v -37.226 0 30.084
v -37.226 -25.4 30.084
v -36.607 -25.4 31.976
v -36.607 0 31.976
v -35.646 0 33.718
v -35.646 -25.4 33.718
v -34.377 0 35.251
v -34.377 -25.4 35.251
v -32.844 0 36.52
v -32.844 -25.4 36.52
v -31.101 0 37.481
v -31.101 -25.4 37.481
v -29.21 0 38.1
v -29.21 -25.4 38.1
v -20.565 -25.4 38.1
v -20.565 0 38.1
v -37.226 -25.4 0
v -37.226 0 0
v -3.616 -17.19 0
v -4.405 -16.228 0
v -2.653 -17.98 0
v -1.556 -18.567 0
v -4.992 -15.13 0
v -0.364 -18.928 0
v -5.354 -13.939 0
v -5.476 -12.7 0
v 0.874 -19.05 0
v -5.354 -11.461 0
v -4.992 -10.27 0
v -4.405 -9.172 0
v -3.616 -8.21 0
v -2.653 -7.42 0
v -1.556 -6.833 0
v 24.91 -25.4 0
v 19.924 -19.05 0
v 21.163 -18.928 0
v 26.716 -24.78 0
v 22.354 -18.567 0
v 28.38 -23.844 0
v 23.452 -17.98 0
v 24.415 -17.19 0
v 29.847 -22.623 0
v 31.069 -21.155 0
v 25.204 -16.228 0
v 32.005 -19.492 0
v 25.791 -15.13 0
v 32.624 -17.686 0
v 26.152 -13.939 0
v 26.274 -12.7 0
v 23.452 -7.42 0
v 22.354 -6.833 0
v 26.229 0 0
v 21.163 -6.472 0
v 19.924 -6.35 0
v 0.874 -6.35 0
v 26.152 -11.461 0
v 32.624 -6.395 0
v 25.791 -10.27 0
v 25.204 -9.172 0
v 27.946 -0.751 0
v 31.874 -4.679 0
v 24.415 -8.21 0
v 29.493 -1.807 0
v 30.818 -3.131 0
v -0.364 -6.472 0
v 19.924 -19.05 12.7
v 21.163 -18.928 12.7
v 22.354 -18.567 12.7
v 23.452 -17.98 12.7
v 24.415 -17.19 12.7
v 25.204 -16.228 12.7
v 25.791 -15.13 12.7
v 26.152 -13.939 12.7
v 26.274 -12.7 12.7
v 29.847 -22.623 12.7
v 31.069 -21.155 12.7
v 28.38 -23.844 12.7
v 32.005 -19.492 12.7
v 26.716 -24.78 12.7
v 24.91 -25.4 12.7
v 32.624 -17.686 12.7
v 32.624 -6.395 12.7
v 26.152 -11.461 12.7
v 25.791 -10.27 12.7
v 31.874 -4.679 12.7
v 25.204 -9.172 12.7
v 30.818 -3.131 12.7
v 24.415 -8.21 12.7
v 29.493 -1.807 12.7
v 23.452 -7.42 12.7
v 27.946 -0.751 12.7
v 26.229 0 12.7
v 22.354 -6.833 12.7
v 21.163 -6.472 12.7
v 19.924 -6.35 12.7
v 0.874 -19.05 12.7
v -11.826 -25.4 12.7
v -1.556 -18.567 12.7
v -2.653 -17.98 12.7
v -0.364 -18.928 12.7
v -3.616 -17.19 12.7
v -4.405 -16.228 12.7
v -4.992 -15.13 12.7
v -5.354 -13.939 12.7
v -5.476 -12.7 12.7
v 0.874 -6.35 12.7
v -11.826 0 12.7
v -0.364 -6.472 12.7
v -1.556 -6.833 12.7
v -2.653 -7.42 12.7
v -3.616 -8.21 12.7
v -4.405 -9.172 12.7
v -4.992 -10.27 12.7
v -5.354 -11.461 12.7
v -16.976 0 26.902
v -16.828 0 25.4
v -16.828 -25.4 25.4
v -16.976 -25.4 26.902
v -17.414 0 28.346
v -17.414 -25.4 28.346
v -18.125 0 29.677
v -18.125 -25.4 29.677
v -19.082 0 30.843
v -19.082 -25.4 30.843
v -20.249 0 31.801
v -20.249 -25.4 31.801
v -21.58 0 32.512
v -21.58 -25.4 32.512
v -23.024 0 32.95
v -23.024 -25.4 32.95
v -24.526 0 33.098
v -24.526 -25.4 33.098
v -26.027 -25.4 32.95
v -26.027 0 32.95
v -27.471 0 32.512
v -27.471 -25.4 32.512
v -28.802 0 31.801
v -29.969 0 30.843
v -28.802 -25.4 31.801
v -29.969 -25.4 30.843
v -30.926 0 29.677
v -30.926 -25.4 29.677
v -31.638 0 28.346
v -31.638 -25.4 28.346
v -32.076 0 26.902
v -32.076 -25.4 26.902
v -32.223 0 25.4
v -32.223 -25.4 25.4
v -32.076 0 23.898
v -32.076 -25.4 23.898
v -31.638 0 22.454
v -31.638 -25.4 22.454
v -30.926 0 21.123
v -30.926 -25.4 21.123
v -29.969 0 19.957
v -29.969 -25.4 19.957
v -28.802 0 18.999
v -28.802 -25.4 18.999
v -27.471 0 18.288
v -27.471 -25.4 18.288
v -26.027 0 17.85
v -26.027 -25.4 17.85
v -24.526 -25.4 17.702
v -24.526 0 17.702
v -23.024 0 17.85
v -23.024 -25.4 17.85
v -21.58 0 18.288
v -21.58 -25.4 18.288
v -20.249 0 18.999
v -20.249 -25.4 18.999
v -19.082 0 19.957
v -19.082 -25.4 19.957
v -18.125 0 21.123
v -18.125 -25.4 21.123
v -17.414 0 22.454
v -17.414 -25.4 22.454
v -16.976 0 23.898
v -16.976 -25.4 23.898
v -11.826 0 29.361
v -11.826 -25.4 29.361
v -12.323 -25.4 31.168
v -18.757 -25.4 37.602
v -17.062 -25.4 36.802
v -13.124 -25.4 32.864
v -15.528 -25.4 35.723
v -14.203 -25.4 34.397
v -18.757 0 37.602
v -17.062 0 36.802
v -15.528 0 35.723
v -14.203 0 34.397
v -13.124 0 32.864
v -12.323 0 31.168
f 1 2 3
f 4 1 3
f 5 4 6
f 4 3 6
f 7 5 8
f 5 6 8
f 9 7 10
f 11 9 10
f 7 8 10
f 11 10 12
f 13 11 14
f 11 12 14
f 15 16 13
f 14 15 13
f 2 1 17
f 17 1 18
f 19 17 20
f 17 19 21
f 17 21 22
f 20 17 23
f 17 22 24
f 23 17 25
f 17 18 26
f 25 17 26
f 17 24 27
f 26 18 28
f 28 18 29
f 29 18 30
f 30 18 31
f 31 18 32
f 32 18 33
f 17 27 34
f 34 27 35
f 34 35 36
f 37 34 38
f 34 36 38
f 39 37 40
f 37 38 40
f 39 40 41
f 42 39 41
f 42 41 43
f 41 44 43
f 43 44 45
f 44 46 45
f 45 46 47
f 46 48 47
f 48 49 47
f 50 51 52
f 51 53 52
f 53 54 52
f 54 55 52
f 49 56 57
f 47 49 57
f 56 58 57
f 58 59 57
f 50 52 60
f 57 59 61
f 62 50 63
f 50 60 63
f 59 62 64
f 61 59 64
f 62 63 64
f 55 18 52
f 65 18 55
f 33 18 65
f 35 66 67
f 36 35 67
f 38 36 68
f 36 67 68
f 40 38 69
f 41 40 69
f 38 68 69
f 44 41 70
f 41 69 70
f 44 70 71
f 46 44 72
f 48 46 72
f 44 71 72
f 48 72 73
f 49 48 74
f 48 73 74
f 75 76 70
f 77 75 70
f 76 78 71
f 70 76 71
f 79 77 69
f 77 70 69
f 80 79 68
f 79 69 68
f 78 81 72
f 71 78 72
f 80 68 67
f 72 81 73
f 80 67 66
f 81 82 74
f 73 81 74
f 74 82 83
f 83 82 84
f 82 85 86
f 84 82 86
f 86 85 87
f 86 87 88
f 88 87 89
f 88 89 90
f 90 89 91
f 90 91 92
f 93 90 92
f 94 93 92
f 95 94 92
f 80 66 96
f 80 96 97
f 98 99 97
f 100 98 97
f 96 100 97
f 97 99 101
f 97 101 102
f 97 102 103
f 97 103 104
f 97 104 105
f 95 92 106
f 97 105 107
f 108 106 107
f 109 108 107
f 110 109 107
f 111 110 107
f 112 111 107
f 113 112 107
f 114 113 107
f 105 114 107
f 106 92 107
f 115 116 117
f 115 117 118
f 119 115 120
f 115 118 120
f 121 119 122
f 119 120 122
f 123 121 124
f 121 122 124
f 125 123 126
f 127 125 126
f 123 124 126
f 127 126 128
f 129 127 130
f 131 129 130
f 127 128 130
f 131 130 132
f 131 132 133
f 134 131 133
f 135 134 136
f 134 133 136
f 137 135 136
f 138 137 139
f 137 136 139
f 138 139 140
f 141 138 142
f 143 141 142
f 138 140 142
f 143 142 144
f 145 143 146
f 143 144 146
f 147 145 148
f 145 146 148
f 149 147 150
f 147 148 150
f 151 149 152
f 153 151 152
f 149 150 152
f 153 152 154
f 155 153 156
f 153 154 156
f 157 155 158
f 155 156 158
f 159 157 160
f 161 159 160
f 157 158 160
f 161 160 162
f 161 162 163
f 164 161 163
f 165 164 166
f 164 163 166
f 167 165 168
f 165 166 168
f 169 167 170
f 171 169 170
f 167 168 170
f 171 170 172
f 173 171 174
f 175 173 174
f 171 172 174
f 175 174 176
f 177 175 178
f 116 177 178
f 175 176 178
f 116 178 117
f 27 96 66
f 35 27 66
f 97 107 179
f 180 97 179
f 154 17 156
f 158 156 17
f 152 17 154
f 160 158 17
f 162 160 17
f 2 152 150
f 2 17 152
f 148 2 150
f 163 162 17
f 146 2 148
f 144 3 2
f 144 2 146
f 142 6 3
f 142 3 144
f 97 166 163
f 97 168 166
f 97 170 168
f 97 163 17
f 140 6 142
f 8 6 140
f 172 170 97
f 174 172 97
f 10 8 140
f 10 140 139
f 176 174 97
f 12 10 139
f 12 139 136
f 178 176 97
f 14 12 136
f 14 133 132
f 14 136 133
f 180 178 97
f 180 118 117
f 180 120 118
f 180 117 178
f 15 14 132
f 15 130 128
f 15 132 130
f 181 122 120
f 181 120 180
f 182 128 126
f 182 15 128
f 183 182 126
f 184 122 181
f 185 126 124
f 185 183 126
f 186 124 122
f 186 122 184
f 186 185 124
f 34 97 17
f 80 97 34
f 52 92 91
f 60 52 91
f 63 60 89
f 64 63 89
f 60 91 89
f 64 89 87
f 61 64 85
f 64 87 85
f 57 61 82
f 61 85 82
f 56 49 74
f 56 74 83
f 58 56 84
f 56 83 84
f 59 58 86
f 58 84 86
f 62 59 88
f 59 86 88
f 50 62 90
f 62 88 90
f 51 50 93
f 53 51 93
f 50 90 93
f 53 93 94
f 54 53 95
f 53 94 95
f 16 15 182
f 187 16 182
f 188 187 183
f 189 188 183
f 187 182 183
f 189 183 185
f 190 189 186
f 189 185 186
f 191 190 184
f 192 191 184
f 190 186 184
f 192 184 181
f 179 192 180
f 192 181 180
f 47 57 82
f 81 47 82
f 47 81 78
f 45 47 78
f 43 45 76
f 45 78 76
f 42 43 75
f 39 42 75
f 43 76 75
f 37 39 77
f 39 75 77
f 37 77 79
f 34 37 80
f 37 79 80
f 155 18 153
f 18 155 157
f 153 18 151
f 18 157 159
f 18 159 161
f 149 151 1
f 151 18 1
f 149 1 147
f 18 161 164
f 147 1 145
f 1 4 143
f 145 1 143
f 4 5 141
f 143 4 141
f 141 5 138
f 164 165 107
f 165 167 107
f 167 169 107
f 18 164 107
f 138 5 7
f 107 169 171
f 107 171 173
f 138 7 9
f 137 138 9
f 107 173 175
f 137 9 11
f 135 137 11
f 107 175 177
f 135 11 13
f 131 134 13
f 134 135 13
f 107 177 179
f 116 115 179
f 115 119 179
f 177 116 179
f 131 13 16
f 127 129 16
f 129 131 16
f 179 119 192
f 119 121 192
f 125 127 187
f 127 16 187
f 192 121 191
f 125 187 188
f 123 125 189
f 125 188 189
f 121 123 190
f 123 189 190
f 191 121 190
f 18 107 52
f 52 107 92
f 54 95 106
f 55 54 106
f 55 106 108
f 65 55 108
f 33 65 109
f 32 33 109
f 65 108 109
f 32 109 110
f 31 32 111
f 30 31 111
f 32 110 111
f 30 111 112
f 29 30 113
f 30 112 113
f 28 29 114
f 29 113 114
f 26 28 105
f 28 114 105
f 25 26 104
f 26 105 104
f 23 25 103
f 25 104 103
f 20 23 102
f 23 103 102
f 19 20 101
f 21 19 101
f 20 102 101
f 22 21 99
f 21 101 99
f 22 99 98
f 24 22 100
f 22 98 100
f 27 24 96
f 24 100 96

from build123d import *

# Parameters (mm, degrees)
F1_DEPTH = 25.4
F2_R     = 7.6978943935
F3_DEPTH = 25.4
F5_DEPTH = 25.4
F7_DEPTH = 12.7
F9_DEPTH = 12.7


with BuildPart() as f1:
    # F0 (on Front) → F1 (new body)
    with BuildSketch(Plane.XZ):
        Polygon((-11.8255742339, 38.1), (-37.2255742339, 38.1), (-37.2255742339, 0), (32.6244257661, 0), (32.6244257661, 12.7), (-11.8255742339, 12.7), align=None)
    extrude(amount=F1_DEPTH)

    # F2 (on face) → F3 (cut)
    with BuildSketch(Plane.XZ.offset(25.4)):
        with Locations((-24.5255742339, 25.4)):
            Circle(F2_R)
    extrude(amount=-F3_DEPTH, mode=Mode.SUBTRACT)

    # F4 (on face) → F5 (cut)
    with BuildSketch(Plane.XZ.offset(25.4)):
        with BuildLine():
            ThreePointArc((-37.2255742339, 30.0844254155), (-34.376772158, 35.2511979241), (-29.2099996494, 38.1))
            Line((-29.2099996494, 38.1), (-37.2255742339, 38.1))
            Line((-37.2255742339, 38.1), (-37.2255742339, 30.0844254155))
        make_face()
        with BuildLine():
            Line((-11.8255742339, 38.1), (-20.5647205525, 38.1))
            ThreePointArc((-20.5647205525, 38.1), (-14.8369913494, 35.0885828844), (-11.8255742339, 29.3608536814))
            Line((-11.8255742339, 29.3608536814), (-11.8255742339, 38.1))
        make_face()
    extrude(amount=-F5_DEPTH, mode=Mode.SUBTRACT)

    # F6 (on face) → F7 (cut)
    with BuildSketch(Plane.XY.offset(12.7)):
        with BuildLine():
            ThreePointArc((26.2744257661, -12.7), (24.4145538267, -8.2098719395), (19.9244257661, -6.35))
            ThreePointArc((19.9244257661, -6.35), (13.5744257661, -12.7), (19.9244257661, -19.05))
            ThreePointArc((19.9244257661, -19.05), (24.4145538267, -17.1901280605), (26.2744257661, -12.7))
        make_face()
        with BuildLine():
            ThreePointArc((0.8744257661, -6.35), (5.3645538267, -8.2098719395), (7.2244257661, -12.7))
            ThreePointArc((7.2244257661, -12.7), (5.3645538267, -17.1901280605), (0.8744257661, -19.05))
            Line((0.8744257661, -19.05), (19.9244257661, -19.05))
            ThreePointArc((19.9244257661, -19.05), (13.5744257661, -12.7), (19.9244257661, -6.35))
            Line((19.9244257661, -6.35), (0.8744257661, -6.35))
        make_face()
        with BuildLine():
            ThreePointArc((0.8744257661, -19.05), (5.3645538267, -17.1901280605), (7.2244257661, -12.7))
            ThreePointArc((7.2244257661, -12.7), (5.3645538267, -8.2098719395), (0.8744257661, -6.35))
            ThreePointArc((0.8744257661, -6.35), (-5.4755742339, -12.7), (0.8744257661, -19.05))
        make_face()
    extrude(amount=-F7_DEPTH, mode=Mode.SUBTRACT)

    # F8 (on face) → F9 (cut)
    with BuildSketch(Plane.XY.offset(12.7)):
        with BuildLine():
            ThreePointArc((26.2291806882, 0), (30.1864649562, -2.4379608099), (32.6244257661, -6.3952450779))
            Line((32.6244257661, -6.3952450779), (32.6244257661, 0))
            Line((32.6244257661, 0), (26.2291806882, 0))
        make_face()
        with BuildLine():
            Line((32.6244257661, -25.4), (32.6244257661, -17.6856669089))
            ThreePointArc((32.6244257661, -17.6856669089), (29.8469452005, -22.6225194344), (24.910092675, -25.4))
            Line((24.910092675, -25.4), (32.6244257661, -25.4))
        make_face()
    extrude(amount=-F9_DEPTH, mode=Mode.SUBTRACT)


solid = f1.part
